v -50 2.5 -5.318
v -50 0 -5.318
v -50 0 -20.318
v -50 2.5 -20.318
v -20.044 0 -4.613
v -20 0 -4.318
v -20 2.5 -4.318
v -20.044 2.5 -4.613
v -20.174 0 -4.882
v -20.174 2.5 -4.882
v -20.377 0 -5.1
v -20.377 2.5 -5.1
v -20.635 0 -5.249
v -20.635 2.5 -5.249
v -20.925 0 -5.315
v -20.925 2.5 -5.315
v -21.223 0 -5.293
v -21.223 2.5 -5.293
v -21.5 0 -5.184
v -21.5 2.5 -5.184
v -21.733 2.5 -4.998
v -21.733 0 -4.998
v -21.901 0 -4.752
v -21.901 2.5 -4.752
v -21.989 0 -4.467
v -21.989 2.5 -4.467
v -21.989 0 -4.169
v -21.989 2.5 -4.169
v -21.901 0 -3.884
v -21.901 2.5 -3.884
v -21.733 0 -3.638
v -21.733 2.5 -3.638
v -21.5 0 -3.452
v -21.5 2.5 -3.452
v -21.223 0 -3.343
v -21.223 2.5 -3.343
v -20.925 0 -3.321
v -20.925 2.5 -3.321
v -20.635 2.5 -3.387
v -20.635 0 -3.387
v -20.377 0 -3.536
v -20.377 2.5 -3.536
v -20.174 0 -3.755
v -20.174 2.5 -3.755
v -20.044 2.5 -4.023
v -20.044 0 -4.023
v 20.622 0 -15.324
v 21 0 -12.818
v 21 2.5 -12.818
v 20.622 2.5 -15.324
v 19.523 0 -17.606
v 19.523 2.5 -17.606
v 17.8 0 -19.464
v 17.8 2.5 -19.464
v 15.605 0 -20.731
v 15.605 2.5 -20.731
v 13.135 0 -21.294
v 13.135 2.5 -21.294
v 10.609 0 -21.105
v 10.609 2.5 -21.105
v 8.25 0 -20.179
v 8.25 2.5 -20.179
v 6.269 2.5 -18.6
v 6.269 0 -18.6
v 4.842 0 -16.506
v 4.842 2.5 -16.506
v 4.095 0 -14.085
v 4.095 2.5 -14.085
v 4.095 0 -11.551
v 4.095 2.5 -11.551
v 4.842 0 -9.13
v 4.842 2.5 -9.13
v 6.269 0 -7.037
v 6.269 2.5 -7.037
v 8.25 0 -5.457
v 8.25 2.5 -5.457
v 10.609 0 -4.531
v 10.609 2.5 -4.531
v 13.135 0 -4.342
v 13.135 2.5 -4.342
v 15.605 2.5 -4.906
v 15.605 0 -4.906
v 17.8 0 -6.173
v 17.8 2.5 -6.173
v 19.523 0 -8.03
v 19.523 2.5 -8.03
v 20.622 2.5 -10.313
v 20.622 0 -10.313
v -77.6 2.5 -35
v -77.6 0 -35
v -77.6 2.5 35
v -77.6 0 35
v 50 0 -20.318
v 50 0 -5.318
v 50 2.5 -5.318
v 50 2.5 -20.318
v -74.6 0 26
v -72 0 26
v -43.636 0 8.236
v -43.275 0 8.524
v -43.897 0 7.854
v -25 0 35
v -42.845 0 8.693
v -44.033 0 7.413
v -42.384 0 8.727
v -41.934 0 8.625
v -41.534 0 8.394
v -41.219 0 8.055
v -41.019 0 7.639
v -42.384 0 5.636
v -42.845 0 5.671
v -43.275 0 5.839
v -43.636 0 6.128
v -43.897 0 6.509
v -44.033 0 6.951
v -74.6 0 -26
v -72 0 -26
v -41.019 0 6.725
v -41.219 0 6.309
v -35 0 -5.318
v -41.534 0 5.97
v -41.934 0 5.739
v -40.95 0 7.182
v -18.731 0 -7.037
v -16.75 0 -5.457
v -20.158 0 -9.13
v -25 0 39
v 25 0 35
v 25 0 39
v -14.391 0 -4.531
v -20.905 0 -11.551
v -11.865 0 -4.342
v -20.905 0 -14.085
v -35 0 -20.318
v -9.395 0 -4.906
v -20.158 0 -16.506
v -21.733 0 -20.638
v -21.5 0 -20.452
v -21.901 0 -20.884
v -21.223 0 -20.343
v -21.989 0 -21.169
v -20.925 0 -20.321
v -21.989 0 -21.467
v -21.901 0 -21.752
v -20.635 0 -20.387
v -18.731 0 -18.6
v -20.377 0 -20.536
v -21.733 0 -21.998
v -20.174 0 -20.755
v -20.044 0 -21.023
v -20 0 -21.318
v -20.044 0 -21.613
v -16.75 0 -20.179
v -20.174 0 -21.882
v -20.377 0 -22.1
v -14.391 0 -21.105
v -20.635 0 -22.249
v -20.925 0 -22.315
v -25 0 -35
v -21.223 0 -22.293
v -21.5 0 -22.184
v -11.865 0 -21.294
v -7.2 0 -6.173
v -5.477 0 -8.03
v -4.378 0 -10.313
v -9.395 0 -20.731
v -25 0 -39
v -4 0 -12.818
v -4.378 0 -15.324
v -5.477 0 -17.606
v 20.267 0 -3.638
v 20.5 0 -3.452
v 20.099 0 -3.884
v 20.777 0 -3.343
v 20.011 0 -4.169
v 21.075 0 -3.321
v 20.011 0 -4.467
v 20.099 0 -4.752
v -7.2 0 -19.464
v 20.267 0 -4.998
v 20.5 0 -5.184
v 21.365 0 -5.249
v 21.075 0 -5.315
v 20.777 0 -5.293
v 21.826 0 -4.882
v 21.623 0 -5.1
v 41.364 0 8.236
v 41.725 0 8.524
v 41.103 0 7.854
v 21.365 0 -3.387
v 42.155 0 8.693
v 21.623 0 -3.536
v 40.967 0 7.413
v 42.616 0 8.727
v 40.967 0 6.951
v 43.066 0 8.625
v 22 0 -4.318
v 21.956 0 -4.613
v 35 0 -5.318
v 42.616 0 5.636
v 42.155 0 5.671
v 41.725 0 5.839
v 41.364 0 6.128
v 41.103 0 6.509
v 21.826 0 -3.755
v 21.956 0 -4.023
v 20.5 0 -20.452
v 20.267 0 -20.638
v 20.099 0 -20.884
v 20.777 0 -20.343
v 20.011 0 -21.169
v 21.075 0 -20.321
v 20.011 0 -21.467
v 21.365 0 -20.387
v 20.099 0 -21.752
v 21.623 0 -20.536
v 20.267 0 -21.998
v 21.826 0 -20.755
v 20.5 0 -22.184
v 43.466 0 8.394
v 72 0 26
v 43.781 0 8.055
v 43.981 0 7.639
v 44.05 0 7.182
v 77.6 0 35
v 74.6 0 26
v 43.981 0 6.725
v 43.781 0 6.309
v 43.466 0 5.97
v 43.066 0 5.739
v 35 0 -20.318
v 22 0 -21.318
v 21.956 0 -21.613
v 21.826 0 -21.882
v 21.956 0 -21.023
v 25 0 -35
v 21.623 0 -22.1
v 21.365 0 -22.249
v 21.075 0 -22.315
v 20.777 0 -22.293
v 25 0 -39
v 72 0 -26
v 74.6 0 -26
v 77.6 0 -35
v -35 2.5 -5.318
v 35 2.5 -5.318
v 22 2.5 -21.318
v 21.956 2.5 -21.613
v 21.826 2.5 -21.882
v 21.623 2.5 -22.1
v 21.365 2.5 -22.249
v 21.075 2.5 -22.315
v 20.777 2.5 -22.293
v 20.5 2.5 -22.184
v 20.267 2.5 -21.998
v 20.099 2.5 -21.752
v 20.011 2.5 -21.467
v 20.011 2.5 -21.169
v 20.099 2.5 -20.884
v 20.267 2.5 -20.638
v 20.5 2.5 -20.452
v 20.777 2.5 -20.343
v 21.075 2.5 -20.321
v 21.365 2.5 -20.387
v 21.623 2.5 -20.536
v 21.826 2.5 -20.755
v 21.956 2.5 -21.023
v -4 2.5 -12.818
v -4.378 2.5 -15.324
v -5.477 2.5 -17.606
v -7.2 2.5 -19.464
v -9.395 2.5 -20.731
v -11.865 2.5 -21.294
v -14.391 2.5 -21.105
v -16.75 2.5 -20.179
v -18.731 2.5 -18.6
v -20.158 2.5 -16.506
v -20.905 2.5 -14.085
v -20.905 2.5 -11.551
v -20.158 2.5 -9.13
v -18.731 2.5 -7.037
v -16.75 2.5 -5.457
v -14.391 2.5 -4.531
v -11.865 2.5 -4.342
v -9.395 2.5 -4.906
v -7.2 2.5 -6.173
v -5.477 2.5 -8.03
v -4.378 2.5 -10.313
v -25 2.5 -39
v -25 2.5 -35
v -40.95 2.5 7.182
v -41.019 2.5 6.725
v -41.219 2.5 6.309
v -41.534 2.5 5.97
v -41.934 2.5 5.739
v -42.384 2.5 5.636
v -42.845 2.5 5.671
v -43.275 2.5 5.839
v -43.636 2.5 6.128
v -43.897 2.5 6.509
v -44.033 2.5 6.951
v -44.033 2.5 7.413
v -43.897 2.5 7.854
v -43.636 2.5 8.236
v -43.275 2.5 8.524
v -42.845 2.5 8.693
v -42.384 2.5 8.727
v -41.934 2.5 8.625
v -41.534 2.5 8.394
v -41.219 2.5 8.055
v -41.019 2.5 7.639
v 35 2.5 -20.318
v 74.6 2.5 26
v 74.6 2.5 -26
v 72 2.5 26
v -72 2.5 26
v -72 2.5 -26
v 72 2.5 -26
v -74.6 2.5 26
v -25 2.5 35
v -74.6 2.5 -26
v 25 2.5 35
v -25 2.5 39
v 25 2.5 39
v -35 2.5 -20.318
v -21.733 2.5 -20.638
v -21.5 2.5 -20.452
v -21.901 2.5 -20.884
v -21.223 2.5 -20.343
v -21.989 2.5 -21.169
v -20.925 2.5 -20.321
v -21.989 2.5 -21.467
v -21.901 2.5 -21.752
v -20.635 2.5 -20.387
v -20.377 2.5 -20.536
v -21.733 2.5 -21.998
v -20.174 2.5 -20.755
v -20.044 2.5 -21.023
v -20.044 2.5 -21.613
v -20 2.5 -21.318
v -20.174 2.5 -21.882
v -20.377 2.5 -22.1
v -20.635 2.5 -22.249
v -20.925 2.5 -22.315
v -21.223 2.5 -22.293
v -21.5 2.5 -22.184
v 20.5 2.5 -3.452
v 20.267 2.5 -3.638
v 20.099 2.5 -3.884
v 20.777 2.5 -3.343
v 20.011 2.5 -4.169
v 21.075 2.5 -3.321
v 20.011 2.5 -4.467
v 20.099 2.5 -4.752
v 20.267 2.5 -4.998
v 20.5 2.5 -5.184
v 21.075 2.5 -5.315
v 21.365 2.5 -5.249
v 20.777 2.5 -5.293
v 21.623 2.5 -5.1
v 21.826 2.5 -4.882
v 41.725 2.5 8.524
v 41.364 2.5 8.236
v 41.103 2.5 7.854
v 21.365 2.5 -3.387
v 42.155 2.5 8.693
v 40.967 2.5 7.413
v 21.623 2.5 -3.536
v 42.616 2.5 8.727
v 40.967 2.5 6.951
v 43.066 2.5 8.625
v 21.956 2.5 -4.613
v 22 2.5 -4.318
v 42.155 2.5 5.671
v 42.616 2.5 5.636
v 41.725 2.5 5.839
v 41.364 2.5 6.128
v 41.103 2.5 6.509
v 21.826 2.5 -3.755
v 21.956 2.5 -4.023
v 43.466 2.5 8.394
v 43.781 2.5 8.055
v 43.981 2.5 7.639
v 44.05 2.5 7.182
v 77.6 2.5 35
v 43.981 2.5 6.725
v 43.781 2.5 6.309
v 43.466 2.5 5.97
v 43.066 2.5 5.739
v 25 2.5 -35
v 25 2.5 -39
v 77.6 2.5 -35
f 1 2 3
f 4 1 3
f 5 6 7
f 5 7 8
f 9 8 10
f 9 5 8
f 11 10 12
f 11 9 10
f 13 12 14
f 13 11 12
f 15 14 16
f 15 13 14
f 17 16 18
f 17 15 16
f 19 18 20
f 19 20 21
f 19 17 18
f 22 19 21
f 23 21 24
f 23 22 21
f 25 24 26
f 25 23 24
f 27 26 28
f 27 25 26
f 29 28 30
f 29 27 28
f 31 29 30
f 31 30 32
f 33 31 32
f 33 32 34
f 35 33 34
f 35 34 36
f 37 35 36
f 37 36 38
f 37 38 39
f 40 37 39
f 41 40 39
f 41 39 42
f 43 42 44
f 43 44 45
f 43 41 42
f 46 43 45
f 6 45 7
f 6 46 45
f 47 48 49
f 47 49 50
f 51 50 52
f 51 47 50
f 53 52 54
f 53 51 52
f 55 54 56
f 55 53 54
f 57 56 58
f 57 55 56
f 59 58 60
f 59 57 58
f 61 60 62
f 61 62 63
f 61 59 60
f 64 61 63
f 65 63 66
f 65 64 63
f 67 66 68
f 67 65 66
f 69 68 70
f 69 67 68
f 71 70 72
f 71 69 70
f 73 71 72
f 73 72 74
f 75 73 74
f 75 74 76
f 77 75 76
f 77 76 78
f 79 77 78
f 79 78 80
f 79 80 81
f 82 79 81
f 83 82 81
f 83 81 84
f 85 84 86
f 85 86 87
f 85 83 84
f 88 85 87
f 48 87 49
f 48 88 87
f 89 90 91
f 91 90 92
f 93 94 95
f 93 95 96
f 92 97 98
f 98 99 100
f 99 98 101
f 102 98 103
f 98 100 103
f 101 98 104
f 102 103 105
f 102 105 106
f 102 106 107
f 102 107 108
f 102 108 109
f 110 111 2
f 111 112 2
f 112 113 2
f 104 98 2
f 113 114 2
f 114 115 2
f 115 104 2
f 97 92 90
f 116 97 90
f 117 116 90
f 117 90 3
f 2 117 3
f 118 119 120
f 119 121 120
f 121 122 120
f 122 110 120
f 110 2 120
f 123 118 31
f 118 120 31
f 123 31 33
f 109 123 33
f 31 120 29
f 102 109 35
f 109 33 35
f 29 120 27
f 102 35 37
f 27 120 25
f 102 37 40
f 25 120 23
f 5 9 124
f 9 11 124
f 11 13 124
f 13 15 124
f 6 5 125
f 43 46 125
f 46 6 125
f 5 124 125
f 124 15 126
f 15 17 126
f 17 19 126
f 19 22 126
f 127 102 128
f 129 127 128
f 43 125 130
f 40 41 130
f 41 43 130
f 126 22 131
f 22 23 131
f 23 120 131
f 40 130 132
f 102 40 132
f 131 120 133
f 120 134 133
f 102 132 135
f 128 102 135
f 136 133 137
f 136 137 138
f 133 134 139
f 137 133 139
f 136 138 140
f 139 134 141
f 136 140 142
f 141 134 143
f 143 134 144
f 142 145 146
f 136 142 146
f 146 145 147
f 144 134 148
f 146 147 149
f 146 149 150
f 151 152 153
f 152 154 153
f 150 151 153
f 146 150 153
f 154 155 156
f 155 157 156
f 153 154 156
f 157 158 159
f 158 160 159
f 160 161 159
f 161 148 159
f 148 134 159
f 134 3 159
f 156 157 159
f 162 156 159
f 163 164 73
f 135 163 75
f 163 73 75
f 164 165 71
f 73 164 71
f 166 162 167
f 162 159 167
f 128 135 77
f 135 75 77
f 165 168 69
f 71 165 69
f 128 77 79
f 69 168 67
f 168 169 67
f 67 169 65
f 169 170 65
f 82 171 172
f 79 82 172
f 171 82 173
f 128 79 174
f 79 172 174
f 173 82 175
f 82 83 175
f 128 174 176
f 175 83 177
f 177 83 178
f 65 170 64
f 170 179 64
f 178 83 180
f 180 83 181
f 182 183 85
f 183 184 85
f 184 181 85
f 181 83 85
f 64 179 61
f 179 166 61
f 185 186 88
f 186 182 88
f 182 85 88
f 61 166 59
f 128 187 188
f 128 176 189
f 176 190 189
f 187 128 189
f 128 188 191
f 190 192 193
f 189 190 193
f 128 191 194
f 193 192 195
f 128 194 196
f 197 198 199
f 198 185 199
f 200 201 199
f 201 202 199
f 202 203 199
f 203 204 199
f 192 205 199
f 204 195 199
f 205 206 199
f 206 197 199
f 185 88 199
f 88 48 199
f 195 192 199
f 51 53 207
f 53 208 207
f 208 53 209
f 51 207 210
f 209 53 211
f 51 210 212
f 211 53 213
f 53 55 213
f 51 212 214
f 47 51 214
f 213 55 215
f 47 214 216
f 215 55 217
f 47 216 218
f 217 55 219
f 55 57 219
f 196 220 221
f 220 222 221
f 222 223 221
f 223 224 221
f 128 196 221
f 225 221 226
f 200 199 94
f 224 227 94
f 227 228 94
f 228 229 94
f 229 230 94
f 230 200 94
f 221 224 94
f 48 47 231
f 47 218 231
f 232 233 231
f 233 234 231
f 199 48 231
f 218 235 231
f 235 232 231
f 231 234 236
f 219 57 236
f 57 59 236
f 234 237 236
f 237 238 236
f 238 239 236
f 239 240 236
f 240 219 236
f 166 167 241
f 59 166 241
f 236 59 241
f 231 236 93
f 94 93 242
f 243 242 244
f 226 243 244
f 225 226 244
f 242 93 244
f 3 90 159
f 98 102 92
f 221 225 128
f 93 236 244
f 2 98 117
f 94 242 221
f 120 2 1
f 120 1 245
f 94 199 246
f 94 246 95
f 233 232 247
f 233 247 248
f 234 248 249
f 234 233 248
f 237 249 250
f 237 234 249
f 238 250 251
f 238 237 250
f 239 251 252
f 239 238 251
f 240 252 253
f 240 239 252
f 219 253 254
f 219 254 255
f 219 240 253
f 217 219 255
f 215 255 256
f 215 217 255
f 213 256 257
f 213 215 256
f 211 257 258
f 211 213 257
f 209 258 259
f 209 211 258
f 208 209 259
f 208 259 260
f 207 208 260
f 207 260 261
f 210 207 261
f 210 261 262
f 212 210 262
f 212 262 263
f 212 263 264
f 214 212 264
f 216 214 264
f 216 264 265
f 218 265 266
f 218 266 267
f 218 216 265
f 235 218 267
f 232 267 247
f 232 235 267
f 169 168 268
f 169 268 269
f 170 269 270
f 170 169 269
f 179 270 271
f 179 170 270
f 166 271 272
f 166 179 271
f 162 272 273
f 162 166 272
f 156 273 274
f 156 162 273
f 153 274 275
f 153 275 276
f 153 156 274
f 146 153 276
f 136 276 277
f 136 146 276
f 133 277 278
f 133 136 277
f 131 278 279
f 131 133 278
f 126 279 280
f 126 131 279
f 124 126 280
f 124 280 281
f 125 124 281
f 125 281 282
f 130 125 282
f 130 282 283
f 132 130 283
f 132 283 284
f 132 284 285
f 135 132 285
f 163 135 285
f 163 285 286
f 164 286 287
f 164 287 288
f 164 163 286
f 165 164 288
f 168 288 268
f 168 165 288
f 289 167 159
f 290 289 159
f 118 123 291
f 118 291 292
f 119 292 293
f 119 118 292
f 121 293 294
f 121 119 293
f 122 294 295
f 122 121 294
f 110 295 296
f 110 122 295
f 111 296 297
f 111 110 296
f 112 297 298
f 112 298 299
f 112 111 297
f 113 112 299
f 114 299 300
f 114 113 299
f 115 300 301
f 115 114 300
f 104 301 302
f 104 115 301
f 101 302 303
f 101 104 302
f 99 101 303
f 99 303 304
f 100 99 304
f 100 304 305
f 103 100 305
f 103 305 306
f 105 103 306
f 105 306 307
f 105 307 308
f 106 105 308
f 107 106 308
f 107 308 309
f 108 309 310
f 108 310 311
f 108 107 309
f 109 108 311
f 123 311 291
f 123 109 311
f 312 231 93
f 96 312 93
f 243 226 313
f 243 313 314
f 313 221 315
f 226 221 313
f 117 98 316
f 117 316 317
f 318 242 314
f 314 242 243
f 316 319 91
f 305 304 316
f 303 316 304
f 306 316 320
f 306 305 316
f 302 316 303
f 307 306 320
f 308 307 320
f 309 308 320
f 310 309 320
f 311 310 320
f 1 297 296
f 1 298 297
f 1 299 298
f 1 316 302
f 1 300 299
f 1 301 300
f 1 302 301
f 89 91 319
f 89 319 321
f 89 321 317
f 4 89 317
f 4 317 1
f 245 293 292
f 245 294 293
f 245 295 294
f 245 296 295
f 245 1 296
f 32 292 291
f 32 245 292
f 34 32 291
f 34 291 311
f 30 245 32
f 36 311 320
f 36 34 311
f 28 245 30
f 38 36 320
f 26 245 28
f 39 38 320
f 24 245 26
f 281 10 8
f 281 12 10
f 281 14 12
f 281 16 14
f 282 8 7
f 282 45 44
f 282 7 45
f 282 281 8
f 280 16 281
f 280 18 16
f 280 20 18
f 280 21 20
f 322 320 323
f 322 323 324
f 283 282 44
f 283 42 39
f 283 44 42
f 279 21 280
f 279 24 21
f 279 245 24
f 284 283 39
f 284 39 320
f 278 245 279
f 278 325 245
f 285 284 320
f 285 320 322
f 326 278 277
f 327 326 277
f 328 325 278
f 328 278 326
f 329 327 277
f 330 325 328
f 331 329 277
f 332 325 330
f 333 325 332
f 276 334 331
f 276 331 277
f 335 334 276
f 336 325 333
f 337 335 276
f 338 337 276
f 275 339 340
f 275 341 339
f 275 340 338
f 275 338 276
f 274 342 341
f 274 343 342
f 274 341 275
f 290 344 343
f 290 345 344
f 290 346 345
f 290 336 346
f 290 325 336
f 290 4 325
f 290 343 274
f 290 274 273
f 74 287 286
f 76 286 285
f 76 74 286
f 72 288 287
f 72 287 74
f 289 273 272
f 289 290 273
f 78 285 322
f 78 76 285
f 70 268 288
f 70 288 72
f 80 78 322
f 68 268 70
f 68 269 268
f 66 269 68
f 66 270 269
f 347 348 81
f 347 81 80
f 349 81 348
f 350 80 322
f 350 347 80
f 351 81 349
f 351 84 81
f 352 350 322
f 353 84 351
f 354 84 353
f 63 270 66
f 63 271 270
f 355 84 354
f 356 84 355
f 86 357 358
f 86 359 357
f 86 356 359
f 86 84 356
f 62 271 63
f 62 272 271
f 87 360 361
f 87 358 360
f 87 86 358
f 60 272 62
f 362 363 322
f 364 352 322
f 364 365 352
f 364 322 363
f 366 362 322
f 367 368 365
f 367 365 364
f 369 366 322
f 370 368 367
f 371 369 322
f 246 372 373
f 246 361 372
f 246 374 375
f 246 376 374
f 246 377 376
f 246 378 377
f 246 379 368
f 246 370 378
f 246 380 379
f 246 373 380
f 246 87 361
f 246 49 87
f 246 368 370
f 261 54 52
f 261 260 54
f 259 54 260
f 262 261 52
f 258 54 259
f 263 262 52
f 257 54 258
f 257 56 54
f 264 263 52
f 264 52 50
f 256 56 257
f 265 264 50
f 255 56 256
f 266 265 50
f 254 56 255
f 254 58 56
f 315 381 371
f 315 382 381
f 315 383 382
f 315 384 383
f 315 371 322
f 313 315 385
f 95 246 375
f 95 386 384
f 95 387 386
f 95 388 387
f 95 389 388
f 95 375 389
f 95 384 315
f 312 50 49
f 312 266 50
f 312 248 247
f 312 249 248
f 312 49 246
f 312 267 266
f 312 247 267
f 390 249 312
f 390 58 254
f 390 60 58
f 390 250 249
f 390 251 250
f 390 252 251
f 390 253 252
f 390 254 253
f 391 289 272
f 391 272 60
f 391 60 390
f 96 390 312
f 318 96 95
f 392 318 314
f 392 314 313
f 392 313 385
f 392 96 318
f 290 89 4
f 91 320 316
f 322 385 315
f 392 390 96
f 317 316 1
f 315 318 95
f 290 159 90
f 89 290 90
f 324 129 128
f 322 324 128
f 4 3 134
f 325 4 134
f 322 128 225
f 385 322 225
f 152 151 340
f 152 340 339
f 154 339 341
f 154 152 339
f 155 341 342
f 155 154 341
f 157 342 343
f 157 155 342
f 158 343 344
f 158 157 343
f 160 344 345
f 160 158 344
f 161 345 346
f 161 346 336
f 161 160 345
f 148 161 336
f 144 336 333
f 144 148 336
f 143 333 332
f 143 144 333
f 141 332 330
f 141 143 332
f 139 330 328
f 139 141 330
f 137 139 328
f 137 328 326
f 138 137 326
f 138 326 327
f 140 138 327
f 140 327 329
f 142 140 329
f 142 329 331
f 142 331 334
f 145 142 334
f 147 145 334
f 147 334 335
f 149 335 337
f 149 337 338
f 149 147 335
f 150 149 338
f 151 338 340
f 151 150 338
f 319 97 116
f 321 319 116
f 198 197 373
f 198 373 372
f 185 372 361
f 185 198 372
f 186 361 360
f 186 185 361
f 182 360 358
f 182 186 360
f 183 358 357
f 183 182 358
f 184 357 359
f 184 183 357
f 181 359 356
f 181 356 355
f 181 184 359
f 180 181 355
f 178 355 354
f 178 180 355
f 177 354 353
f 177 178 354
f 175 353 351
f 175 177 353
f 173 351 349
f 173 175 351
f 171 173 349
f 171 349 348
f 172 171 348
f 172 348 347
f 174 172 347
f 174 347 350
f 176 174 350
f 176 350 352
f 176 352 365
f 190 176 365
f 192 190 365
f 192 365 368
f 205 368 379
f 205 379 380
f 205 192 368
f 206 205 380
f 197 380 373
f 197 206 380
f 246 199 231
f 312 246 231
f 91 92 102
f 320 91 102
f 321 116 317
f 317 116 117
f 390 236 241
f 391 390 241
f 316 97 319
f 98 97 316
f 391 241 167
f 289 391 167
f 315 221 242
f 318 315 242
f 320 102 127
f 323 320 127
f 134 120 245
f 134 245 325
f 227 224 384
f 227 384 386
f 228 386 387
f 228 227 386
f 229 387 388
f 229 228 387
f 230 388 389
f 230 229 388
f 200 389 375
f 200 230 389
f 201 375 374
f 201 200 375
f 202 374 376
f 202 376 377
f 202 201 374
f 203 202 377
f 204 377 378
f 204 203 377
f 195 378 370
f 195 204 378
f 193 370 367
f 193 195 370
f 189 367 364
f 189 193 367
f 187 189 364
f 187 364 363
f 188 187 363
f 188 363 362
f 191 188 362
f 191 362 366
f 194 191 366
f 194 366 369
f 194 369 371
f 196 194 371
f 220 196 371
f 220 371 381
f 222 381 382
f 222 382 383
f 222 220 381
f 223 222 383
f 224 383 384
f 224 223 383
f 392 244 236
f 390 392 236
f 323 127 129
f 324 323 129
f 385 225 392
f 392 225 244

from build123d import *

# Parameters (mm, degrees)
SKETCH2_R           = 8.5
SKETCH2_R_2         = 1
SKETCH2_R_3         = 1.55
SKETCH2_W           = 2.6
SKETCH2_H           = 52
SKETCH2_W_2         = 15
SKETCH2_H_2         = 15
BOSS_EXTRUDE1_DEPTH = 2.5


with BuildPart() as part:
    # Sketch2 → Boss-Extrude1 (new body)
    with BuildSketch(Plane(origin=(0, 0, 0), x_dir=(1, 0, 0), z_dir=(0, 1, 0))):
        Polygon((-25, 35), (-77.6, 35), (-77.6, -35), (-25, -35), (-25, -39), (25, -39), (25, -35), (77.6, -35), (77.6, 35), (25, 35), (25, 39), (-25, 39), align=None)
        with Locations((-12.5, 12.818198975)):
            Circle(SKETCH2_R, mode=Mode.SUBTRACT)
        with Locations((-21, 21.318198975)):
            Circle(SKETCH2_R_2, mode=Mode.SUBTRACT)
        with Locations((-21, 4.318198975)):
            Circle(SKETCH2_R_2, mode=Mode.SUBTRACT)
        with Locations((21, 4.318198975)):
            Circle(SKETCH2_R_2, mode=Mode.SUBTRACT)
        with Locations((21, 21.318198975)):
            Circle(SKETCH2_R_2, mode=Mode.SUBTRACT)
        with Locations((12.5, 12.818198975)):
            Circle(SKETCH2_R, mode=Mode.SUBTRACT)
        with Locations((-42.5, -7.181801025)):
            Circle(SKETCH2_R_3, mode=Mode.SUBTRACT)
        with Locations((42.5, -7.181801025)):
            Circle(SKETCH2_R_3, mode=Mode.SUBTRACT)
        with Locations((-73.3, 0)):
            Rectangle(SKETCH2_W, SKETCH2_H, mode=Mode.SUBTRACT)
        with Locations((73.3, 0)):
            Rectangle(SKETCH2_W, SKETCH2_H, mode=Mode.SUBTRACT)
        with Locations((42.5, 12.818198975)):
            Rectangle(SKETCH2_W_2, SKETCH2_H_2, mode=Mode.SUBTRACT)
        with Locations((-42.5, 12.818198975)):
            Rectangle(SKETCH2_W_2, SKETCH2_H_2, mode=Mode.SUBTRACT)
    extrude(amount=BOSS_EXTRUDE1_DEPTH)


solid = part.part
